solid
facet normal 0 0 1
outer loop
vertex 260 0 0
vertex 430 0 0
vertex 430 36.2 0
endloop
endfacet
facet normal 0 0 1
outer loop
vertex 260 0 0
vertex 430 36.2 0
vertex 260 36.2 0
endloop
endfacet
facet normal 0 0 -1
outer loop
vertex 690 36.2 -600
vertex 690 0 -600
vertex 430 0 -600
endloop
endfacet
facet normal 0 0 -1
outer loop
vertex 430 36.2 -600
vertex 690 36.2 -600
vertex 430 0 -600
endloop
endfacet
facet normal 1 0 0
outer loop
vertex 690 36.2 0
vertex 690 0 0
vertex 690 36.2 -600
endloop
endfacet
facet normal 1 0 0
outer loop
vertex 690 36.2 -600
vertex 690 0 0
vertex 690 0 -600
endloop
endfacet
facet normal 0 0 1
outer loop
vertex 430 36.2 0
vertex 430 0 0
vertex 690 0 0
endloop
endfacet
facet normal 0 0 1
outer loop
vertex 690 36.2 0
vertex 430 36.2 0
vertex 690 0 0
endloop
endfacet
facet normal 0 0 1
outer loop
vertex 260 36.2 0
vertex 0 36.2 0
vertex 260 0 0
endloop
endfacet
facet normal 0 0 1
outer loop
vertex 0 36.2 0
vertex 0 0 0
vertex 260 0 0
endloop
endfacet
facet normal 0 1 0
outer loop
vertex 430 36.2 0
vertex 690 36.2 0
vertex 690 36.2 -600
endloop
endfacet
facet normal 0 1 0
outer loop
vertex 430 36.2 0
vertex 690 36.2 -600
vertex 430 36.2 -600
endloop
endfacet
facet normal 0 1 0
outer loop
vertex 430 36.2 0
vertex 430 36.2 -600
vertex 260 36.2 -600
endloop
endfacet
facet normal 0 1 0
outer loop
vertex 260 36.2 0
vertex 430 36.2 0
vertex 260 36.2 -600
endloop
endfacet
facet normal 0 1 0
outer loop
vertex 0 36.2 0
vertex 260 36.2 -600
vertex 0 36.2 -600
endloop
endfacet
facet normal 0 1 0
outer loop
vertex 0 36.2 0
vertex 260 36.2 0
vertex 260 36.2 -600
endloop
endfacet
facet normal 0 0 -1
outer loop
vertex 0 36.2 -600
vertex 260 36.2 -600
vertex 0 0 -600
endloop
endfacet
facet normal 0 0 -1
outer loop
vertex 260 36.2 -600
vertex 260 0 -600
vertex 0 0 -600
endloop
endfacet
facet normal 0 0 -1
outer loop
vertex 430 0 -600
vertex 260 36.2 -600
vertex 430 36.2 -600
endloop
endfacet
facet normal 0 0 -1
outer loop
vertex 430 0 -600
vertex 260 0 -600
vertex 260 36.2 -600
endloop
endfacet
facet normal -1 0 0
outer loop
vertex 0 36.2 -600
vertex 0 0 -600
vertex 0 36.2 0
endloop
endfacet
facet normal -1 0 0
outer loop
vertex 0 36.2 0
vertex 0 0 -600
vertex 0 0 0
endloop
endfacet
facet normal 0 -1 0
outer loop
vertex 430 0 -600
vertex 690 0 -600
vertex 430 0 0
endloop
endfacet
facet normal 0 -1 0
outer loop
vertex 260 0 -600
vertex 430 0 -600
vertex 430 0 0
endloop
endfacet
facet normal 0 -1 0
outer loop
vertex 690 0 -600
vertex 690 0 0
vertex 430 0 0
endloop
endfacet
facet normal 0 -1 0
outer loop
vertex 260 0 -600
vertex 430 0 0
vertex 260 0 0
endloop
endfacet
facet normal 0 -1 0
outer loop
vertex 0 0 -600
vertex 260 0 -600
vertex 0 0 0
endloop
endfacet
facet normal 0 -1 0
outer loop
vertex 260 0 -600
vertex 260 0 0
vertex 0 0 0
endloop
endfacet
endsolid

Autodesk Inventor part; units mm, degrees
ref_plane "YZ Plane" through (0, 0, 0) normal (1, 0, 0) x (0, 1, 0)
ref_plane "XZ Plane" through (0, 0, 0) normal (0, 1, 0) x (-1, 0, 0)
ref_plane "XY Plane" through (0, 0, 0) normal (0, 0, 1) x (1, 0, 0)
sketch "Boceto1" plane through (0, 0, 0) normal (0, 1, 0) x (-1, 0, 0)
  line L0 (-690, 0) -> (-690, -628.4316)
  line L1 (0, -628.4316) -> (0, 0)
  line L2 (0, 0) -> (-260, 0)
  line L3 (-430, 0) -> (-690, 0)
  line L4 (-690, -600) -> (-430, -600)
  line L5 (-260, -600) -> (0, -600)
  line L6 (-260, -600) -> (-430, -600)
  line L7 (-430, 0) -> (-260, 0)
  point P0 (0, -600)
  dimension "d16" = 690
  dimension "d21" = 600
  dimension "d22" = 600
extrude "Extrusión1" add sketch "Boceto1" along normal blind 36.2
properties part number "piso2" material "Aluminio 6061"
